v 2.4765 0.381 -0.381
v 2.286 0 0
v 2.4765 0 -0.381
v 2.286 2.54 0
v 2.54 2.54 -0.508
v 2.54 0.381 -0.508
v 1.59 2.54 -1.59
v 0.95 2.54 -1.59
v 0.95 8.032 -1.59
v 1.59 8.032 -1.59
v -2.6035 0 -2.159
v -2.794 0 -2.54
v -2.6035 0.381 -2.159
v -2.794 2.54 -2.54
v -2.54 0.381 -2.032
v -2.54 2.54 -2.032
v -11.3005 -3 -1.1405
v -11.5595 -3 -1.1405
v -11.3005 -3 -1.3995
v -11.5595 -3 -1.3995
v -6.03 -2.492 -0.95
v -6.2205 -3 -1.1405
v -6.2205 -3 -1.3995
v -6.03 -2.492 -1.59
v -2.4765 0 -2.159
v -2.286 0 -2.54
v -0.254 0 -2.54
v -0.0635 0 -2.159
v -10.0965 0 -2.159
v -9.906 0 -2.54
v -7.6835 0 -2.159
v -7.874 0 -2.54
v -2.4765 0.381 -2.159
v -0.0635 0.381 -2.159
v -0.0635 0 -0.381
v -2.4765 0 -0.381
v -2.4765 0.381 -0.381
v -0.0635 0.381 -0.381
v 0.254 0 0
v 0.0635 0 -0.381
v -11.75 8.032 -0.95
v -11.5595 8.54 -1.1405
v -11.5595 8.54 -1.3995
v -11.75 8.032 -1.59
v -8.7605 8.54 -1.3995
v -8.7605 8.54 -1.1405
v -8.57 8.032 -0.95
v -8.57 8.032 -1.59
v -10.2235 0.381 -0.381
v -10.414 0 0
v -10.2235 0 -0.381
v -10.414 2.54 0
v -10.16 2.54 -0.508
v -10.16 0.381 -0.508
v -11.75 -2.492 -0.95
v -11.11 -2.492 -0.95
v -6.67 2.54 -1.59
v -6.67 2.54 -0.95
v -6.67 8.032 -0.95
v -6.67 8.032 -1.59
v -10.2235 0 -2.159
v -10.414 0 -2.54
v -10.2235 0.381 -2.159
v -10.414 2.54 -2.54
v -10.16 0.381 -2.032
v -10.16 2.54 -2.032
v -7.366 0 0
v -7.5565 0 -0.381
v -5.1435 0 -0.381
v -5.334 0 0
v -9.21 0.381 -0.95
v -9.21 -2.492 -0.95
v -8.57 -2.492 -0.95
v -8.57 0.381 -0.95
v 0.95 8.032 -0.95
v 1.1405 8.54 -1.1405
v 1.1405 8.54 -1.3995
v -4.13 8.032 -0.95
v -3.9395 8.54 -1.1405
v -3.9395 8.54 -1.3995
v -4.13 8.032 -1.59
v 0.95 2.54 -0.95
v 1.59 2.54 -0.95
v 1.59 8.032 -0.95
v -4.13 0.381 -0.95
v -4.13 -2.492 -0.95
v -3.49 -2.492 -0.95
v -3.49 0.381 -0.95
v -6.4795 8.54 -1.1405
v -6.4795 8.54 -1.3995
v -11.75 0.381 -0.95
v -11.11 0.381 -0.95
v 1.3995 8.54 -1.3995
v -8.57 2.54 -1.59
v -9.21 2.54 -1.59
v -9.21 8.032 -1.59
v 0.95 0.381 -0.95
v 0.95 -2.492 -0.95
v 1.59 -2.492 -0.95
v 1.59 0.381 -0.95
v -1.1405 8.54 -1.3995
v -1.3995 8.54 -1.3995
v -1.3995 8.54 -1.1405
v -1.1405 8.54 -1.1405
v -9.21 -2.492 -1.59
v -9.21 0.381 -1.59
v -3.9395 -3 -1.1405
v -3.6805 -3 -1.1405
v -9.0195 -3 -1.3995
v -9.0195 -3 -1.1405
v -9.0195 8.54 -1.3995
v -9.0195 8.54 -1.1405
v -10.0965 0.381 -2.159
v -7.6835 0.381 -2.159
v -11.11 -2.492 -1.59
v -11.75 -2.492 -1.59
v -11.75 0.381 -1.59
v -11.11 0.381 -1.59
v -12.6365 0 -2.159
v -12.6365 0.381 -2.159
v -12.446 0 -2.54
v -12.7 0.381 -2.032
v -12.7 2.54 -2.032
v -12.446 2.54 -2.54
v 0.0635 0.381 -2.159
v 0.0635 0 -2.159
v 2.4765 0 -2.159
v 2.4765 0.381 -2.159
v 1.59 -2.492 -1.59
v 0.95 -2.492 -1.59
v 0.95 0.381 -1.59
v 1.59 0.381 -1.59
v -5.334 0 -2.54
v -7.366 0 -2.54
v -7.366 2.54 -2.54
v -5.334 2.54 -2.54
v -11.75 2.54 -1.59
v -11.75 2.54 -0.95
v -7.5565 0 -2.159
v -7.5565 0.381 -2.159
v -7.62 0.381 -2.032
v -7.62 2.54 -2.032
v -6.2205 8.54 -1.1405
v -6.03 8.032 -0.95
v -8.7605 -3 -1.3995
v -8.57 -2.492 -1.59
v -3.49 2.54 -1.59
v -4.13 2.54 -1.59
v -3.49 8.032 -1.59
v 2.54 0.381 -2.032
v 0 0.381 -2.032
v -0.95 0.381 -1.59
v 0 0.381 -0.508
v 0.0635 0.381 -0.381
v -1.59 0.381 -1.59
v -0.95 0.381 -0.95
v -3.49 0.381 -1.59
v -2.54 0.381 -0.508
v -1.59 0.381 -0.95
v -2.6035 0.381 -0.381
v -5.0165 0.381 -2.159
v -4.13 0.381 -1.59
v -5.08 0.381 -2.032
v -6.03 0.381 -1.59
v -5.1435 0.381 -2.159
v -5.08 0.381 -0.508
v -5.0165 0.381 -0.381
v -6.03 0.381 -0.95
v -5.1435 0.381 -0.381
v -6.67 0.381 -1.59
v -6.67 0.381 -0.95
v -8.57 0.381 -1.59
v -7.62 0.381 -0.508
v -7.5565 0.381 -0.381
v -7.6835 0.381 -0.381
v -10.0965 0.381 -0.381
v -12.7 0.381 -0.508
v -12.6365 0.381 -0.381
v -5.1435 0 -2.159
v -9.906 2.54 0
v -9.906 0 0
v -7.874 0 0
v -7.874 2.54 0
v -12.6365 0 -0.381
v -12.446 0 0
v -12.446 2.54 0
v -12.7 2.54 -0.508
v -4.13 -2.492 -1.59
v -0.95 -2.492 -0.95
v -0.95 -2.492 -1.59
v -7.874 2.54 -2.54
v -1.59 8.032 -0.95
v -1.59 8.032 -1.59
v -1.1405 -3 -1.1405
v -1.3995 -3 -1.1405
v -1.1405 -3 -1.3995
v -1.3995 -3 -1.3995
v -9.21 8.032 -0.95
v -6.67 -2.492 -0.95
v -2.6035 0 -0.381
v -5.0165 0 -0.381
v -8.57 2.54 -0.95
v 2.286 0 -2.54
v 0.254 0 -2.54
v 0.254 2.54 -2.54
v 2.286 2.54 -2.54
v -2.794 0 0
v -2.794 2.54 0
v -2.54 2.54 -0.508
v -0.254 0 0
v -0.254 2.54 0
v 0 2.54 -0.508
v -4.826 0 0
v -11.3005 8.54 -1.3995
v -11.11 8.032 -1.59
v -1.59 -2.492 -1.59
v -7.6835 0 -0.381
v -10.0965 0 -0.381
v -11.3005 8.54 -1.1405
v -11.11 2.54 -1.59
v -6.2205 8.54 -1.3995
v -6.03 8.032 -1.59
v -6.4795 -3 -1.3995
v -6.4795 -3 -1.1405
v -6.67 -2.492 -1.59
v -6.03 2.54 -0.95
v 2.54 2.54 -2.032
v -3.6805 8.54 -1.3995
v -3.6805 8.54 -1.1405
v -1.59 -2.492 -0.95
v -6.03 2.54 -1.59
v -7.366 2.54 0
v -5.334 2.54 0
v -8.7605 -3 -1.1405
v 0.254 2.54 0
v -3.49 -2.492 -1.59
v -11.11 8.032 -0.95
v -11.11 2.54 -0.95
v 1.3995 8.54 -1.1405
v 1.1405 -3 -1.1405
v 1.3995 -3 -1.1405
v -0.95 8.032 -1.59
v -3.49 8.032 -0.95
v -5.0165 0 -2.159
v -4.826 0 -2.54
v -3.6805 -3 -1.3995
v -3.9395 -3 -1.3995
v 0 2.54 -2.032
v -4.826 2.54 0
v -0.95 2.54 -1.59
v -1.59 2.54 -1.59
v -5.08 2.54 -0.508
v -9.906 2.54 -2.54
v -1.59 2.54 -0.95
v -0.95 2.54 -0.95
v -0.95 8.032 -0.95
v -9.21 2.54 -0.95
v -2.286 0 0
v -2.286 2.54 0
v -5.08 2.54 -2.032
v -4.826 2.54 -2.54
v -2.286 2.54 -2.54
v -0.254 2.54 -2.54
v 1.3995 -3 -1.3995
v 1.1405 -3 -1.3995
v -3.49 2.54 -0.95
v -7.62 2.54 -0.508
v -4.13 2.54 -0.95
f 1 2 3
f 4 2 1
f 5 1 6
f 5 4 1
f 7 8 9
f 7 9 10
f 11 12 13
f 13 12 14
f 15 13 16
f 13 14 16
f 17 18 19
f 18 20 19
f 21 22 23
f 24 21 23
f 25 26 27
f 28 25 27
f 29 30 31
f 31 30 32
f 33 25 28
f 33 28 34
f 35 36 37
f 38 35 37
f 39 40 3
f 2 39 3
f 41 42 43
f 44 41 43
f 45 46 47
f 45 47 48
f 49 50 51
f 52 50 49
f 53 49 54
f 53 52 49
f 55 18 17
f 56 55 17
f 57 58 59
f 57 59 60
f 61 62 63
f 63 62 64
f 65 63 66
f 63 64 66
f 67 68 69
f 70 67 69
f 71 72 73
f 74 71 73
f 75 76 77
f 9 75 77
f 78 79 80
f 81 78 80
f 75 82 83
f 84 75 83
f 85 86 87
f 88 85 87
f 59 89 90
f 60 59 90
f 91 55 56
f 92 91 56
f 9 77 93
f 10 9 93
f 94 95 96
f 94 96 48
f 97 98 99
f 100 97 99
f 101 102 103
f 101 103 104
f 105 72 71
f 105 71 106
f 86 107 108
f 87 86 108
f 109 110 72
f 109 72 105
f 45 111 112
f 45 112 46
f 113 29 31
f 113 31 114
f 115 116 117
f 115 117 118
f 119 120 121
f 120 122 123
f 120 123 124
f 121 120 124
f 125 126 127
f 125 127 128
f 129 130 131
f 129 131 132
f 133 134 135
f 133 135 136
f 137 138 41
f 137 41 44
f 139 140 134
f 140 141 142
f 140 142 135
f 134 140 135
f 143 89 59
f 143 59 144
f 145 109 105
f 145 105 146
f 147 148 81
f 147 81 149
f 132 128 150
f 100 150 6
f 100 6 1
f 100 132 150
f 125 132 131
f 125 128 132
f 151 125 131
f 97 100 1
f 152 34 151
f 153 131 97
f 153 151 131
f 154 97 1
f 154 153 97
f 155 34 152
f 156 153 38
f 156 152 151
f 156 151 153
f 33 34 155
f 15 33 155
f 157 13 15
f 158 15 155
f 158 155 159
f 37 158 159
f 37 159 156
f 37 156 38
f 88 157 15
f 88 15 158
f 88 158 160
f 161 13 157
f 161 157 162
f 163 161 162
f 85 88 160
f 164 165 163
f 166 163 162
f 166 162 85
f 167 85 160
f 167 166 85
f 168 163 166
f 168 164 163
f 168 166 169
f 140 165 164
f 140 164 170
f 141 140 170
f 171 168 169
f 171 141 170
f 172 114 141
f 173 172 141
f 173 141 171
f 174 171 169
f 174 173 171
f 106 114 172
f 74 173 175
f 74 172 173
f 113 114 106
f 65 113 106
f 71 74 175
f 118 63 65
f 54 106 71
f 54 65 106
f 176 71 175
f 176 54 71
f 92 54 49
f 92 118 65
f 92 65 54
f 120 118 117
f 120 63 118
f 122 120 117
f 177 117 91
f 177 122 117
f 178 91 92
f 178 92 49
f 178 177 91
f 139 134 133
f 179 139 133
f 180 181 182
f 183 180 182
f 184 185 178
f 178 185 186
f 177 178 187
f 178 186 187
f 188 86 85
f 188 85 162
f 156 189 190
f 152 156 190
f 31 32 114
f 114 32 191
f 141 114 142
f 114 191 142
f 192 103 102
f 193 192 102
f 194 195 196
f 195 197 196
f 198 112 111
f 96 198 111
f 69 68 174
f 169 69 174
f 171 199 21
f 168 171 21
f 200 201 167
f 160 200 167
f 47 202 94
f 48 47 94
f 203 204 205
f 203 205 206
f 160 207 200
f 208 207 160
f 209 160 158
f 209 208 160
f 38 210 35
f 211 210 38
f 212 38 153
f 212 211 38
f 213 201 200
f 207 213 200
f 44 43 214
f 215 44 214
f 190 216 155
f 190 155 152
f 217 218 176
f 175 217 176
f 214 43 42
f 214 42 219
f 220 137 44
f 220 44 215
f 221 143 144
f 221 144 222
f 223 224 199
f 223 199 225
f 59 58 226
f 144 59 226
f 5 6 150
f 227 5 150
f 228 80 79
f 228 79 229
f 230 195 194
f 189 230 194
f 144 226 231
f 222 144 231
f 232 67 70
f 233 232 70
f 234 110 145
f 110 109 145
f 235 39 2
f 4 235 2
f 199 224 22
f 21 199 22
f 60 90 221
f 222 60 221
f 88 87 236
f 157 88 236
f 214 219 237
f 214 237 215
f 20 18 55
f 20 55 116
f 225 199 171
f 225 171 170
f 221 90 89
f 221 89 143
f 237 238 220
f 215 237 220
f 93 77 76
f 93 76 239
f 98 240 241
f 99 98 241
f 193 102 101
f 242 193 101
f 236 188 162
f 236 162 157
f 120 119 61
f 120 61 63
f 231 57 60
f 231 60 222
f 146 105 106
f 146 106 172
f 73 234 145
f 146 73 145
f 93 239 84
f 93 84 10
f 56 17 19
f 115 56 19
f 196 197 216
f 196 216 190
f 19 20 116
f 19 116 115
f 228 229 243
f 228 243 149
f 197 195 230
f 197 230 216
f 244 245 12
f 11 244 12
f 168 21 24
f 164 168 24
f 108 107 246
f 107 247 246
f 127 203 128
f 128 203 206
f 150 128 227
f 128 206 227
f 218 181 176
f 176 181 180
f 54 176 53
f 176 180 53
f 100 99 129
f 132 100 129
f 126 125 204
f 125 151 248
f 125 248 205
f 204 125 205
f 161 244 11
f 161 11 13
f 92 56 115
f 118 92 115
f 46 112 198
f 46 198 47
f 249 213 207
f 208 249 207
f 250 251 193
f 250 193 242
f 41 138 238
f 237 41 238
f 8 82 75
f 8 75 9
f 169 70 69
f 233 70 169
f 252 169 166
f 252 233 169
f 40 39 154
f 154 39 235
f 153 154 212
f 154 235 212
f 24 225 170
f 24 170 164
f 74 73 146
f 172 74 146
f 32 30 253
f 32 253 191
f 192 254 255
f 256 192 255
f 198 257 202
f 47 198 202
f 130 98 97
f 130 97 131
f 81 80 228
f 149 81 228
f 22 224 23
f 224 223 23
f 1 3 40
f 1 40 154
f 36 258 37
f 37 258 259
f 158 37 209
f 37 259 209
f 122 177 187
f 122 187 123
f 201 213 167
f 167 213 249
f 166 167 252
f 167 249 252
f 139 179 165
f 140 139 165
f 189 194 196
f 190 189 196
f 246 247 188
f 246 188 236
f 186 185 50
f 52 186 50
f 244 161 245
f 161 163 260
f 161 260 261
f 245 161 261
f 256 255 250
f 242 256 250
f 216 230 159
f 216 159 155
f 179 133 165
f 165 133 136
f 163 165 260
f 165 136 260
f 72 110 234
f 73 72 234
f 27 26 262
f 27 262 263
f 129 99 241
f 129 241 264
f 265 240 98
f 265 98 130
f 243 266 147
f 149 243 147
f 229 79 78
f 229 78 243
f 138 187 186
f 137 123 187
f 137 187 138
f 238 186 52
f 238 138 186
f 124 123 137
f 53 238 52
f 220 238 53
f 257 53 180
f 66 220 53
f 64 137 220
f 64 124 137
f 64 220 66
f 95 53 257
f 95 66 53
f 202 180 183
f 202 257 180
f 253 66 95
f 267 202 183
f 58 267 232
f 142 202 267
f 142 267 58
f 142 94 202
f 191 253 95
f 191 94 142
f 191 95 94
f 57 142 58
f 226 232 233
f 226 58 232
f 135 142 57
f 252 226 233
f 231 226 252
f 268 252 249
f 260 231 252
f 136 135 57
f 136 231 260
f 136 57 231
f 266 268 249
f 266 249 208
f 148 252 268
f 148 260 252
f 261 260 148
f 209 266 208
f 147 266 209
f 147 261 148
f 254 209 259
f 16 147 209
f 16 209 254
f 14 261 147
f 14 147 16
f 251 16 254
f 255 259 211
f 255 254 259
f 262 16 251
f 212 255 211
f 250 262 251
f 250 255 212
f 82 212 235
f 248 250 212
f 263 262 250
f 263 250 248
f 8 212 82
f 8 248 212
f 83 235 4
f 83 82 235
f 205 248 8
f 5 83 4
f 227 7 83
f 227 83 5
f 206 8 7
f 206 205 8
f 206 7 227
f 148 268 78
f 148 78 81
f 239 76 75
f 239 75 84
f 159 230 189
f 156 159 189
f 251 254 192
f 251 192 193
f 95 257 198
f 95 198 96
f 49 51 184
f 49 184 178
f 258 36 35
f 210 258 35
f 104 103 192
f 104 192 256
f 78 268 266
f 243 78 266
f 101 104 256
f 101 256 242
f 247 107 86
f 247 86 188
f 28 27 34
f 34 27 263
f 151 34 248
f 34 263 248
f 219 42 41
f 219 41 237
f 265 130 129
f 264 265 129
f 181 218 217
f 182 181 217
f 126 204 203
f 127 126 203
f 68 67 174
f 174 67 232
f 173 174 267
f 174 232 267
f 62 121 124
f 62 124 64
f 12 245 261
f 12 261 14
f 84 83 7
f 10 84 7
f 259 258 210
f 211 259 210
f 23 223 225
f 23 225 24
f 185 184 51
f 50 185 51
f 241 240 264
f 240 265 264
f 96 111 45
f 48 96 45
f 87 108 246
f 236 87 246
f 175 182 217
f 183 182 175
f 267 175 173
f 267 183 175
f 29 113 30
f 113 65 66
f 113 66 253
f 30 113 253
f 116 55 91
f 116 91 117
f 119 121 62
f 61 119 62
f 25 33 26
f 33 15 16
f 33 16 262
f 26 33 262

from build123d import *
from OCP.BRepFilletAPI import BRepFilletAPI_MakeChamfer

# Parameters (mm, degrees)
SKETCH1_W                     = 2.54
SKETCH1_H                     = 2.54
MAIN_BODY_DEPTH               = 2.54
SKETCH3_W                     = 1.778
SKETCH3_H                     = 0.381
CUT_EXTRUDE1_DEPTH            = 5.399409051
CUT_EXTRUDE2_DEPTH            = 5.399409051
BODY_PATTERN_COUNT            = 6
BODY_PATTERN_PITCH            = 2.54
PIN_START                     = -5.54
SKETCH2_W                     = 0.64
SKETCH2_H                     = 0.64
PIN_DEPTH                     = 11.54
CHAMFER1_SIZE                 = 0.508
CHAMFER1_SIZE2                = 0.1905
CHAMFER2_SIZE                 = 0.1905
CHAMFER2_SIZE2                = 0.508
PIN_PATTERN_COUNT             = 6
PIN_PATTERN_PITCH             = 2.54
CHAMFER1_OF_PIN_PATTERN_SIZE  = 0.508
CHAMFER1_OF_PIN_PATTERN_SIZE2 = 0.1905
CHAMFER2_OF_PIN_PATTERN_SIZE2 = 0.1905
CHAMFER2_OF_PIN_PATTERN_SIZE  = 0.508


with BuildPart() as part:
    # Sketch1 → Main Body (new body)
    with BuildSketch(Plane(origin=(0, 0, 0), x_dir=(1, 0, 0), z_dir=(0, 1, 0))):
        with Locations((1.27, 1.27)):
            Rectangle(SKETCH1_W, SKETCH1_H)
    main_body = extrude(amount=MAIN_BODY_DEPTH)

    # Sketch3 → Cut-Extrude1 (cut, through all)
    with BuildSketch(Plane.ZY):
        with Locations((-1.27, 0.1905)):
            Rectangle(SKETCH3_W, SKETCH3_H)
    cut_extrude1 = extrude(amount=-CUT_EXTRUDE1_DEPTH, mode=Mode.SUBTRACT)

    # Sketch4 → Cut-Extrude2 (cut, through all)
    with BuildSketch(Plane(origin=(0, 2.54, 0), x_dir=(1, 0, 0), z_dir=(0, 1, 0))):
        Polygon((0.254, 2.54), (0, 2.54), (0, 2.032), align=None)
        Polygon((2.54, 2.54), (2.286, 2.54), (2.54, 2.032), align=None)
        Polygon((0.254, 0), (0, 0.508), (0, 0), align=None)
        Polygon((2.54, 0), (2.286, 0), (2.54, 0.508), align=None)
    cut_extrude2 = extrude(amount=-CUT_EXTRUDE2_DEPTH, mode=Mode.SUBTRACT)

    # Body Pattern: Main Body, Cut-Extrude1, Cut-Extrude2 ×6
    with Locations(*[(-i * BODY_PATTERN_PITCH, 0, 0) for i in range(1, BODY_PATTERN_COUNT)]):
        add(main_body)
        add(cut_extrude1, mode=Mode.SUBTRACT)
        add(cut_extrude2, mode=Mode.SUBTRACT)

    # Sketch2 → Pin (add)
    with BuildSketch(Plane(origin=(0, 2.54, 0), x_dir=(1, 0, 0), z_dir=(0, 1, 0)).offset(PIN_START)):
        with Locations((1.27, 1.27)):
            Rectangle(SKETCH2_W, SKETCH2_H)
    pin = extrude(amount=PIN_DEPTH)

    # Chamfer1: one chamfer whose edges measure the first distance from different faces: ONE call of the kernel's chamfer builder (chamfer() names one face for all edges)
    chamfer1_edges_1 = [part.edges().sort_by_distance(p)[0] for p in [
        (0.95, 8.54, -1.27),
    ]]
    chamfer1_side_1 = [part.faces().sort_by_distance(p)[0] for p in [
        (0.95, 5.54, -1.27),
    ]]
    chamfer1_edges_2 = [part.edges().sort_by_distance(p)[0] for p in [
        (1.27, 8.54, -0.95),
    ]]
    chamfer1_side_2 = [part.faces().sort_by_distance(p)[0] for p in [
        (1.27, 5.54, -0.95),
    ]]
    chamfer1_edges_3 = [part.edges().sort_by_distance(p)[0] for p in [
        (1.59, 8.54, -1.27),
    ]]
    chamfer1_side_3 = [part.faces().sort_by_distance(p)[0] for p in [
        (1.59, 5.54, -1.27),
    ]]
    chamfer1_edges_4 = [part.edges().sort_by_distance(p)[0] for p in [
        (1.27, 8.54, -1.59),
    ]]
    chamfer1_side_4 = [part.faces().sort_by_distance(p)[0] for p in [
        (1.27, 5.54, -1.59),
    ]]
    chamfer1 = BRepFilletAPI_MakeChamfer(part.part.solid().wrapped)
    for e in chamfer1_edges_1:
        chamfer1.Add(CHAMFER1_SIZE, CHAMFER1_SIZE2, e.wrapped, chamfer1_side_1[0].wrapped)  # the first distance lies on this face
    for e in chamfer1_edges_2:
        chamfer1.Add(CHAMFER1_SIZE, CHAMFER1_SIZE2, e.wrapped, chamfer1_side_2[0].wrapped)  # the first distance lies on this face
    for e in chamfer1_edges_3:
        chamfer1.Add(CHAMFER1_SIZE, CHAMFER1_SIZE2, e.wrapped, chamfer1_side_3[0].wrapped)  # the first distance lies on this face
    for e in chamfer1_edges_4:
        chamfer1.Add(CHAMFER1_SIZE, CHAMFER1_SIZE2, e.wrapped, chamfer1_side_4[0].wrapped)  # the first distance lies on this face
    add(Compound.cast(chamfer1.Shape()), mode=Mode.REPLACE)

    # Chamfer2
    chamfer2_edges = [part.edges().sort_by_distance(p)[0] for p in [
        (1.27, -3, -0.95),
        (1.59, -3, -1.27),
        (1.27, -3, -1.59),
        (0.95, -3, -1.27),
    ]]
    chamfer2_side = [part.faces().sort_by_distance(p)[0] for p in [
        (1.27, -3, -1.27),
    ]]
    chamfer(chamfer2_edges, length=CHAMFER2_SIZE, length2=CHAMFER2_SIZE2, reference=chamfer2_side[0])

    # Pin Pattern: Pin ×6
    with Locations(*[(-i * PIN_PATTERN_PITCH, 0, 0) for i in range(1, PIN_PATTERN_COUNT)]):
        add(pin)

    # Chamfer1 of Pin Pattern: one chamfer whose edges measure the first distance from different faces: ONE call of the kernel's chamfer builder (chamfer() names one face for all edges)
    chamfer1_of_pin_pattern_edges_1 = [part.edges().sort_by_distance(p)[0] for p in [
        (-1.59, 8.54, -1.27),
    ]]
    chamfer1_of_pin_pattern_side_1 = [part.faces().sort_by_distance(p)[0] for p in [
        (-1.59, 5.54, -1.27),
    ]]
    chamfer1_of_pin_pattern_edges_2 = [part.edges().sort_by_distance(p)[0] for p in [
        (-1.27, 8.54, -0.95),
    ]]
    chamfer1_of_pin_pattern_side_2 = [part.faces().sort_by_distance(p)[0] for p in [
        (-1.27, 5.54, -0.95),
    ]]
    chamfer1_of_pin_pattern_edges_3 = [part.edges().sort_by_distance(p)[0] for p in [
        (-0.95, 8.54, -1.27),
    ]]
    chamfer1_of_pin_pattern_side_3 = [part.faces().sort_by_distance(p)[0] for p in [
        (-0.95, 5.54, -1.27),
    ]]
    chamfer1_of_pin_pattern_edges_4 = [part.edges().sort_by_distance(p)[0] for p in [
        (-1.27, 8.54, -1.59),
    ]]
    chamfer1_of_pin_pattern_side_4 = [part.faces().sort_by_distance(p)[0] for p in [
        (-1.27, 5.54, -1.59),
    ]]
    chamfer1_of_pin_pattern_edges_5 = [part.edges().sort_by_distance(p)[0] for p in [
        (-4.13, 8.54, -1.27),
    ]]
    chamfer1_of_pin_pattern_side_5 = [part.faces().sort_by_distance(p)[0] for p in [
        (-4.13, 5.54, -1.27),
    ]]
    chamfer1_of_pin_pattern_edges_6 = [part.edges().sort_by_distance(p)[0] for p in [
        (-3.81, 8.54, -0.95),
    ]]
    chamfer1_of_pin_pattern_side_6 = [part.faces().sort_by_distance(p)[0] for p in [
        (-3.81, 5.54, -0.95),
    ]]
    chamfer1_of_pin_pattern_edges_7 = [part.edges().sort_by_distance(p)[0] for p in [
        (-3.49, 8.54, -1.27),
    ]]
    chamfer1_of_pin_pattern_side_7 = [part.faces().sort_by_distance(p)[0] for p in [
        (-3.49, 5.54, -1.27),
    ]]
    chamfer1_of_pin_pattern_edges_8 = [part.edges().sort_by_distance(p)[0] for p in [
        (-3.81, 8.54, -1.59),
    ]]
    chamfer1_of_pin_pattern_side_8 = [part.faces().sort_by_distance(p)[0] for p in [
        (-3.81, 5.54, -1.59),
    ]]
    chamfer1_of_pin_pattern_edges_9 = [part.edges().sort_by_distance(p)[0] for p in [
        (-6.67, 8.54, -1.27),
    ]]
    chamfer1_of_pin_pattern_side_9 = [part.faces().sort_by_distance(p)[0] for p in [
        (-6.67, 5.54, -1.27),
    ]]
    chamfer1_of_pin_pattern_edges_10 = [part.edges().sort_by_distance(p)[0] for p in [
        (-6.35, 8.54, -0.95),
    ]]
    chamfer1_of_pin_pattern_side_10 = [part.faces().sort_by_distance(p)[0] for p in [
        (-6.35, 5.54, -0.95),
    ]]
    chamfer1_of_pin_pattern_edges_11 = [part.edges().sort_by_distance(p)[0] for p in [
        (-6.03, 8.54, -1.27),
    ]]
    chamfer1_of_pin_pattern_side_11 = [part.faces().sort_by_distance(p)[0] for p in [
        (-6.03, 5.54, -1.27),
    ]]
    chamfer1_of_pin_pattern_edges_12 = [part.edges().sort_by_distance(p)[0] for p in [
        (-6.35, 8.54, -1.59),
    ]]
    chamfer1_of_pin_pattern_side_12 = [part.faces().sort_by_distance(p)[0] for p in [
        (-6.35, 5.54, -1.59),
    ]]
    chamfer1_of_pin_pattern_edges_13 = [part.edges().sort_by_distance(p)[0] for p in [
        (-9.21, 8.54, -1.27),
    ]]
    chamfer1_of_pin_pattern_side_13 = [part.faces().sort_by_distance(p)[0] for p in [
        (-9.21, 5.54, -1.27),
    ]]
    chamfer1_of_pin_pattern_edges_14 = [part.edges().sort_by_distance(p)[0] for p in [
        (-8.89, 8.54, -0.95),
    ]]
    chamfer1_of_pin_pattern_side_14 = [part.faces().sort_by_distance(p)[0] for p in [
        (-8.89, 5.54, -0.95),
    ]]
    chamfer1_of_pin_pattern_edges_15 = [part.edges().sort_by_distance(p)[0] for p in [
        (-8.57, 8.54, -1.27),
    ]]
    chamfer1_of_pin_pattern_side_15 = [part.faces().sort_by_distance(p)[0] for p in [
        (-8.57, 5.54, -1.27),
    ]]
    chamfer1_of_pin_pattern_edges_16 = [part.edges().sort_by_distance(p)[0] for p in [
        (-8.89, 8.54, -1.59),
    ]]
    chamfer1_of_pin_pattern_side_16 = [part.faces().sort_by_distance(p)[0] for p in [
        (-8.89, 5.54, -1.59),
    ]]
    chamfer1_of_pin_pattern_edges_17 = [part.edges().sort_by_distance(p)[0] for p in [
        (-11.75, 8.54, -1.27),
    ]]
    chamfer1_of_pin_pattern_side_17 = [part.faces().sort_by_distance(p)[0] for p in [
        (-11.75, 5.54, -1.27),
    ]]
    chamfer1_of_pin_pattern_edges_18 = [part.edges().sort_by_distance(p)[0] for p in [
        (-11.43, 8.54, -0.95),
    ]]
    chamfer1_of_pin_pattern_side_18 = [part.faces().sort_by_distance(p)[0] for p in [
        (-11.43, 5.54, -0.95),
    ]]
    chamfer1_of_pin_pattern_edges_19 = [part.edges().sort_by_distance(p)[0] for p in [
        (-11.11, 8.54, -1.27),
    ]]
    chamfer1_of_pin_pattern_side_19 = [part.faces().sort_by_distance(p)[0] for p in [
        (-11.11, 5.54, -1.27),
    ]]
    chamfer1_of_pin_pattern_edges_20 = [part.edges().sort_by_distance(p)[0] for p in [
        (-11.43, 8.54, -1.59),
    ]]
    chamfer1_of_pin_pattern_side_20 = [part.faces().sort_by_distance(p)[0] for p in [
        (-11.43, 5.54, -1.59),
    ]]
    chamfer1_of_pin_pattern = BRepFilletAPI_MakeChamfer(part.part.solid().wrapped)
    for e in chamfer1_of_pin_pattern_edges_1:
        chamfer1_of_pin_pattern.Add(CHAMFER1_OF_PIN_PATTERN_SIZE, CHAMFER1_OF_PIN_PATTERN_SIZE2, e.wrapped, chamfer1_of_pin_pattern_side_1[0].wrapped)  # the first distance lies on this face
    for e in chamfer1_of_pin_pattern_edges_2:
        chamfer1_of_pin_pattern.Add(CHAMFER1_OF_PIN_PATTERN_SIZE, CHAMFER1_OF_PIN_PATTERN_SIZE2, e.wrapped, chamfer1_of_pin_pattern_side_2[0].wrapped)  # the first distance lies on this face
    for e in chamfer1_of_pin_pattern_edges_3:
        chamfer1_of_pin_pattern.Add(CHAMFER1_OF_PIN_PATTERN_SIZE, CHAMFER1_OF_PIN_PATTERN_SIZE2, e.wrapped, chamfer1_of_pin_pattern_side_3[0].wrapped)  # the first distance lies on this face
    for e in chamfer1_of_pin_pattern_edges_4:
        chamfer1_of_pin_pattern.Add(CHAMFER1_OF_PIN_PATTERN_SIZE, CHAMFER1_OF_PIN_PATTERN_SIZE2, e.wrapped, chamfer1_of_pin_pattern_side_4[0].wrapped)  # the first distance lies on this face
    for e in chamfer1_of_pin_pattern_edges_5:
        chamfer1_of_pin_pattern.Add(CHAMFER1_OF_PIN_PATTERN_SIZE, CHAMFER1_OF_PIN_PATTERN_SIZE2, e.wrapped, chamfer1_of_pin_pattern_side_5[0].wrapped)  # the first distance lies on this face
    for e in chamfer1_of_pin_pattern_edges_6:
        chamfer1_of_pin_pattern.Add(CHAMFER1_OF_PIN_PATTERN_SIZE, CHAMFER1_OF_PIN_PATTERN_SIZE2, e.wrapped, chamfer1_of_pin_pattern_side_6[0].wrapped)  # the first distance lies on this face
    for e in chamfer1_of_pin_pattern_edges_7:
        chamfer1_of_pin_pattern.Add(CHAMFER1_OF_PIN_PATTERN_SIZE, CHAMFER1_OF_PIN_PATTERN_SIZE2, e.wrapped, chamfer1_of_pin_pattern_side_7[0].wrapped)  # the first distance lies on this face
    for e in chamfer1_of_pin_pattern_edges_8:
        chamfer1_of_pin_pattern.Add(CHAMFER1_OF_PIN_PATTERN_SIZE, CHAMFER1_OF_PIN_PATTERN_SIZE2, e.wrapped, chamfer1_of_pin_pattern_side_8[0].wrapped)  # the first distance lies on this face
    for e in chamfer1_of_pin_pattern_edges_9:
        chamfer1_of_pin_pattern.Add(CHAMFER1_OF_PIN_PATTERN_SIZE, CHAMFER1_OF_PIN_PATTERN_SIZE2, e.wrapped, chamfer1_of_pin_pattern_side_9[0].wrapped)  # the first distance lies on this face
    for e in chamfer1_of_pin_pattern_edges_10:
        chamfer1_of_pin_pattern.Add(CHAMFER1_OF_PIN_PATTERN_SIZE, CHAMFER1_OF_PIN_PATTERN_SIZE2, e.wrapped, chamfer1_of_pin_pattern_side_10[0].wrapped)  # the first distance lies on this face
    for e in chamfer1_of_pin_pattern_edges_11:
        chamfer1_of_pin_pattern.Add(CHAMFER1_OF_PIN_PATTERN_SIZE, CHAMFER1_OF_PIN_PATTERN_SIZE2, e.wrapped, chamfer1_of_pin_pattern_side_11[0].wrapped)  # the first distance lies on this face
    for e in chamfer1_of_pin_pattern_edges_12:
        chamfer1_of_pin_pattern.Add(CHAMFER1_OF_PIN_PATTERN_SIZE, CHAMFER1_OF_PIN_PATTERN_SIZE2, e.wrapped, chamfer1_of_pin_pattern_side_12[0].wrapped)  # the first distance lies on this face
    for e in chamfer1_of_pin_pattern_edges_13:
        chamfer1_of_pin_pattern.Add(CHAMFER1_OF_PIN_PATTERN_SIZE, CHAMFER1_OF_PIN_PATTERN_SIZE2, e.wrapped, chamfer1_of_pin_pattern_side_13[0].wrapped)  # the first distance lies on this face
    for e in chamfer1_of_pin_pattern_edges_14:
        chamfer1_of_pin_pattern.Add(CHAMFER1_OF_PIN_PATTERN_SIZE, CHAMFER1_OF_PIN_PATTERN_SIZE2, e.wrapped, chamfer1_of_pin_pattern_side_14[0].wrapped)  # the first distance lies on this face
    for e in chamfer1_of_pin_pattern_edges_15:
        chamfer1_of_pin_pattern.Add(CHAMFER1_OF_PIN_PATTERN_SIZE, CHAMFER1_OF_PIN_PATTERN_SIZE2, e.wrapped, chamfer1_of_pin_pattern_side_15[0].wrapped)  # the first distance lies on this face
    for e in chamfer1_of_pin_pattern_edges_16:
        chamfer1_of_pin_pattern.Add(CHAMFER1_OF_PIN_PATTERN_SIZE, CHAMFER1_OF_PIN_PATTERN_SIZE2, e.wrapped, chamfer1_of_pin_pattern_side_16[0].wrapped)  # the first distance lies on this face
    for e in chamfer1_of_pin_pattern_edges_17:
        chamfer1_of_pin_pattern.Add(CHAMFER1_OF_PIN_PATTERN_SIZE, CHAMFER1_OF_PIN_PATTERN_SIZE2, e.wrapped, chamfer1_of_pin_pattern_side_17[0].wrapped)  # the first distance lies on this face
    for e in chamfer1_of_pin_pattern_edges_18:
        chamfer1_of_pin_pattern.Add(CHAMFER1_OF_PIN_PATTERN_SIZE, CHAMFER1_OF_PIN_PATTERN_SIZE2, e.wrapped, chamfer1_of_pin_pattern_side_18[0].wrapped)  # the first distance lies on this face
    for e in chamfer1_of_pin_pattern_edges_19:
        chamfer1_of_pin_pattern.Add(CHAMFER1_OF_PIN_PATTERN_SIZE, CHAMFER1_OF_PIN_PATTERN_SIZE2, e.wrapped, chamfer1_of_pin_pattern_side_19[0].wrapped)  # the first distance lies on this face
    for e in chamfer1_of_pin_pattern_edges_20:
        chamfer1_of_pin_pattern.Add(CHAMFER1_OF_PIN_PATTERN_SIZE, CHAMFER1_OF_PIN_PATTERN_SIZE2, e.wrapped, chamfer1_of_pin_pattern_side_20[0].wrapped)  # the first distance lies on this face
    add(Compound.cast(chamfer1_of_pin_pattern.Shape()), mode=Mode.REPLACE)

    # Chamfer2 of Pin Pattern
    chamfer2_of_pin_pattern_edges = [part.edges().sort_by_distance(p)[0] for p in [
        (-1.27, -3, -0.95),
        (-0.95, -3, -1.27),
        (-1.27, -3, -1.59),
        (-1.59, -3, -1.27),
        (-3.81, -3, -0.95),
        (-3.49, -3, -1.27),
        (-3.81, -3, -1.59),
        (-4.13, -3, -1.27),
        (-6.35, -3, -0.95),
        (-6.03, -3, -1.27),
        (-6.35, -3, -1.59),
        (-6.67, -3, -1.27),
        (-8.89, -3, -0.95),
        (-8.57, -3, -1.27),
        (-8.89, -3, -1.59),
        (-9.21, -3, -1.27),
        (-11.43, -3, -0.95),
        (-11.11, -3, -1.27),
        (-11.43, -3, -1.59),
        (-11.75, -3, -1.27),
    ]]
    chamfer(chamfer2_of_pin_pattern_edges, length=CHAMFER2_OF_PIN_PATTERN_SIZE, length2=CHAMFER2_OF_PIN_PATTERN_SIZE2)


solid = part.part
